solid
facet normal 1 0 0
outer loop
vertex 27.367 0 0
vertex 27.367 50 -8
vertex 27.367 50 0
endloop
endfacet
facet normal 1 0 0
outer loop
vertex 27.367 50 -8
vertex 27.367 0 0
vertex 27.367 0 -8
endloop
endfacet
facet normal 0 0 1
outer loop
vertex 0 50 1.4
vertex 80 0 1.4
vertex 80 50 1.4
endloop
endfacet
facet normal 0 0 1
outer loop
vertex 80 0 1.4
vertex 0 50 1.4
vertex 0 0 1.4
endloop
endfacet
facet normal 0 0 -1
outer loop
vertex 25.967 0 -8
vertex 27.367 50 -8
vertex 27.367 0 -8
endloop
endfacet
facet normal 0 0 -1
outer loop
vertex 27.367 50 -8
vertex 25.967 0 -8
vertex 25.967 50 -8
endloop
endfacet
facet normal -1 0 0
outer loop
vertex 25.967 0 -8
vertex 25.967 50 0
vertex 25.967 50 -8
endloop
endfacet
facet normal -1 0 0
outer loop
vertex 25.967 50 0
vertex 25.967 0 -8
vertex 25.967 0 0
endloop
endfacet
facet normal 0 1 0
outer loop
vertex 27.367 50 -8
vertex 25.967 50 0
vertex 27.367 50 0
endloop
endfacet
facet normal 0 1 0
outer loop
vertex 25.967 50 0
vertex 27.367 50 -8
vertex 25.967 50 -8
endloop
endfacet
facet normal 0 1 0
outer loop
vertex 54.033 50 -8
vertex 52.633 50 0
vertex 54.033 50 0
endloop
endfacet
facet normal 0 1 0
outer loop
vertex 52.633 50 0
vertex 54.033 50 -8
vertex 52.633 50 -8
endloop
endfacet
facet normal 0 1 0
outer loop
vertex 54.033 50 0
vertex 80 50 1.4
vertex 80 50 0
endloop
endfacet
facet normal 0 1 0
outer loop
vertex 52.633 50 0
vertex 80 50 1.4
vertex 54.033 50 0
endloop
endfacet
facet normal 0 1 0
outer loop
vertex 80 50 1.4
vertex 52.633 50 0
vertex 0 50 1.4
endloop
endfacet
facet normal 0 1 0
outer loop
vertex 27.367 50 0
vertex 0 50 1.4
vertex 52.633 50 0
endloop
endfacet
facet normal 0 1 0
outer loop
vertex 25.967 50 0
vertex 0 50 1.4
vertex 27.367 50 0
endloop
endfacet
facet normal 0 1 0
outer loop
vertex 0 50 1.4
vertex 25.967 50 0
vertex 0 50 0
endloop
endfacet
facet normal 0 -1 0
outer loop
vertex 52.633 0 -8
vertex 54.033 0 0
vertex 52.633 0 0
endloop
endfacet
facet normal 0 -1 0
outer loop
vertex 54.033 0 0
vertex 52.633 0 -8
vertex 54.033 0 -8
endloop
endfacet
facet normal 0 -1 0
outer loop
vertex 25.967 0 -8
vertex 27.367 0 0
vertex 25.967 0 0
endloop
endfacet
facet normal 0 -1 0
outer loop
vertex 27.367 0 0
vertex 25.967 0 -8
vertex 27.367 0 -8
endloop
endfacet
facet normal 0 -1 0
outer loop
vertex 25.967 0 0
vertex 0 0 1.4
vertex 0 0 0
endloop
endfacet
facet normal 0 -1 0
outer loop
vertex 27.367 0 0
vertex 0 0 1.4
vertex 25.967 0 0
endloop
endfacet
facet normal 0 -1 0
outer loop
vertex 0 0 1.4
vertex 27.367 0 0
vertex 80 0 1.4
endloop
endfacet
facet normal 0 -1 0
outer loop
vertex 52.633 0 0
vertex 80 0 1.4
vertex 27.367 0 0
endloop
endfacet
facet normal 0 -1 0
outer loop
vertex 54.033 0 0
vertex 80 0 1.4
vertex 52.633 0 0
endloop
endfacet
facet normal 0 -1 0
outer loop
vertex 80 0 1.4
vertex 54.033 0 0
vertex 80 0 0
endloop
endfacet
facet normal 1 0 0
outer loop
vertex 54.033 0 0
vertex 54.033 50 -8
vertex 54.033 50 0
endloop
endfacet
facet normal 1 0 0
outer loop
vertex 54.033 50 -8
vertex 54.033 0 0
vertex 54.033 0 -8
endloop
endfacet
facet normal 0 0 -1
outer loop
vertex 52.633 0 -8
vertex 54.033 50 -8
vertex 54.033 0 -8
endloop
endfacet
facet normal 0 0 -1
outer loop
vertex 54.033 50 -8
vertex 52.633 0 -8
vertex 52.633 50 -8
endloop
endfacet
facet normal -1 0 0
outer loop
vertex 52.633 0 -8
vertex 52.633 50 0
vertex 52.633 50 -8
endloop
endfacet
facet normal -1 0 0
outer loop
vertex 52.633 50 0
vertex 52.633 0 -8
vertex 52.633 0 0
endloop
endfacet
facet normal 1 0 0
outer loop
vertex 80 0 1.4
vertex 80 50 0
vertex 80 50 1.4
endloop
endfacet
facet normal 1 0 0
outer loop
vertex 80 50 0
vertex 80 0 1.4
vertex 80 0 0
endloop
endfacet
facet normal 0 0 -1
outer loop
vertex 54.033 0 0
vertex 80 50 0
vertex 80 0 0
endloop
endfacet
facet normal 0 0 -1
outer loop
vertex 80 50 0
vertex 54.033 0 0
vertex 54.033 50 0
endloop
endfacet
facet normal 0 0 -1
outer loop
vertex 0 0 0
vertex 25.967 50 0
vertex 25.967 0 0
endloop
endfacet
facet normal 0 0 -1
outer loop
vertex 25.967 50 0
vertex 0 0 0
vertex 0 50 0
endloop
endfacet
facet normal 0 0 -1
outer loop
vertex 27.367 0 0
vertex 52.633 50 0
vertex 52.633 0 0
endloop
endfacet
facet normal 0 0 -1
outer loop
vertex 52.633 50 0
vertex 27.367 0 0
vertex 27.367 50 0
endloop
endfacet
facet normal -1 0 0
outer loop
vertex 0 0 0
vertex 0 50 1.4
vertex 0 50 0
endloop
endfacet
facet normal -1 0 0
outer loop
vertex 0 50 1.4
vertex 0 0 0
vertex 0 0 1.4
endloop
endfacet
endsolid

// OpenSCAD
$fn = 32;

// ----------------------------------------------------------------------
// Ribbed panel: 1.4 mm panel
// ----------------------------------------------------------------------

// --- parameters (mm) ---
panel_l = 80;             // panel length, X
panel_w = 50;             // panel width, Y
panel_t = 1.4;            // panel thickness, Z
rib_t = 1.4;              // rib thickness
rib_h = 8;                // rib height below the panel
ribs = 2;                 // number of ribs

total_h = panel_t + rib_h;  // overall height

union() {
  cube([panel_l, panel_w, panel_t]);
  for (i = [1 : ribs])
    translate([i * panel_l / (ribs + 1) - rib_t / 2, 0, -rib_h])
      cube([rib_t, panel_w, rib_h + panel_t]);
}
